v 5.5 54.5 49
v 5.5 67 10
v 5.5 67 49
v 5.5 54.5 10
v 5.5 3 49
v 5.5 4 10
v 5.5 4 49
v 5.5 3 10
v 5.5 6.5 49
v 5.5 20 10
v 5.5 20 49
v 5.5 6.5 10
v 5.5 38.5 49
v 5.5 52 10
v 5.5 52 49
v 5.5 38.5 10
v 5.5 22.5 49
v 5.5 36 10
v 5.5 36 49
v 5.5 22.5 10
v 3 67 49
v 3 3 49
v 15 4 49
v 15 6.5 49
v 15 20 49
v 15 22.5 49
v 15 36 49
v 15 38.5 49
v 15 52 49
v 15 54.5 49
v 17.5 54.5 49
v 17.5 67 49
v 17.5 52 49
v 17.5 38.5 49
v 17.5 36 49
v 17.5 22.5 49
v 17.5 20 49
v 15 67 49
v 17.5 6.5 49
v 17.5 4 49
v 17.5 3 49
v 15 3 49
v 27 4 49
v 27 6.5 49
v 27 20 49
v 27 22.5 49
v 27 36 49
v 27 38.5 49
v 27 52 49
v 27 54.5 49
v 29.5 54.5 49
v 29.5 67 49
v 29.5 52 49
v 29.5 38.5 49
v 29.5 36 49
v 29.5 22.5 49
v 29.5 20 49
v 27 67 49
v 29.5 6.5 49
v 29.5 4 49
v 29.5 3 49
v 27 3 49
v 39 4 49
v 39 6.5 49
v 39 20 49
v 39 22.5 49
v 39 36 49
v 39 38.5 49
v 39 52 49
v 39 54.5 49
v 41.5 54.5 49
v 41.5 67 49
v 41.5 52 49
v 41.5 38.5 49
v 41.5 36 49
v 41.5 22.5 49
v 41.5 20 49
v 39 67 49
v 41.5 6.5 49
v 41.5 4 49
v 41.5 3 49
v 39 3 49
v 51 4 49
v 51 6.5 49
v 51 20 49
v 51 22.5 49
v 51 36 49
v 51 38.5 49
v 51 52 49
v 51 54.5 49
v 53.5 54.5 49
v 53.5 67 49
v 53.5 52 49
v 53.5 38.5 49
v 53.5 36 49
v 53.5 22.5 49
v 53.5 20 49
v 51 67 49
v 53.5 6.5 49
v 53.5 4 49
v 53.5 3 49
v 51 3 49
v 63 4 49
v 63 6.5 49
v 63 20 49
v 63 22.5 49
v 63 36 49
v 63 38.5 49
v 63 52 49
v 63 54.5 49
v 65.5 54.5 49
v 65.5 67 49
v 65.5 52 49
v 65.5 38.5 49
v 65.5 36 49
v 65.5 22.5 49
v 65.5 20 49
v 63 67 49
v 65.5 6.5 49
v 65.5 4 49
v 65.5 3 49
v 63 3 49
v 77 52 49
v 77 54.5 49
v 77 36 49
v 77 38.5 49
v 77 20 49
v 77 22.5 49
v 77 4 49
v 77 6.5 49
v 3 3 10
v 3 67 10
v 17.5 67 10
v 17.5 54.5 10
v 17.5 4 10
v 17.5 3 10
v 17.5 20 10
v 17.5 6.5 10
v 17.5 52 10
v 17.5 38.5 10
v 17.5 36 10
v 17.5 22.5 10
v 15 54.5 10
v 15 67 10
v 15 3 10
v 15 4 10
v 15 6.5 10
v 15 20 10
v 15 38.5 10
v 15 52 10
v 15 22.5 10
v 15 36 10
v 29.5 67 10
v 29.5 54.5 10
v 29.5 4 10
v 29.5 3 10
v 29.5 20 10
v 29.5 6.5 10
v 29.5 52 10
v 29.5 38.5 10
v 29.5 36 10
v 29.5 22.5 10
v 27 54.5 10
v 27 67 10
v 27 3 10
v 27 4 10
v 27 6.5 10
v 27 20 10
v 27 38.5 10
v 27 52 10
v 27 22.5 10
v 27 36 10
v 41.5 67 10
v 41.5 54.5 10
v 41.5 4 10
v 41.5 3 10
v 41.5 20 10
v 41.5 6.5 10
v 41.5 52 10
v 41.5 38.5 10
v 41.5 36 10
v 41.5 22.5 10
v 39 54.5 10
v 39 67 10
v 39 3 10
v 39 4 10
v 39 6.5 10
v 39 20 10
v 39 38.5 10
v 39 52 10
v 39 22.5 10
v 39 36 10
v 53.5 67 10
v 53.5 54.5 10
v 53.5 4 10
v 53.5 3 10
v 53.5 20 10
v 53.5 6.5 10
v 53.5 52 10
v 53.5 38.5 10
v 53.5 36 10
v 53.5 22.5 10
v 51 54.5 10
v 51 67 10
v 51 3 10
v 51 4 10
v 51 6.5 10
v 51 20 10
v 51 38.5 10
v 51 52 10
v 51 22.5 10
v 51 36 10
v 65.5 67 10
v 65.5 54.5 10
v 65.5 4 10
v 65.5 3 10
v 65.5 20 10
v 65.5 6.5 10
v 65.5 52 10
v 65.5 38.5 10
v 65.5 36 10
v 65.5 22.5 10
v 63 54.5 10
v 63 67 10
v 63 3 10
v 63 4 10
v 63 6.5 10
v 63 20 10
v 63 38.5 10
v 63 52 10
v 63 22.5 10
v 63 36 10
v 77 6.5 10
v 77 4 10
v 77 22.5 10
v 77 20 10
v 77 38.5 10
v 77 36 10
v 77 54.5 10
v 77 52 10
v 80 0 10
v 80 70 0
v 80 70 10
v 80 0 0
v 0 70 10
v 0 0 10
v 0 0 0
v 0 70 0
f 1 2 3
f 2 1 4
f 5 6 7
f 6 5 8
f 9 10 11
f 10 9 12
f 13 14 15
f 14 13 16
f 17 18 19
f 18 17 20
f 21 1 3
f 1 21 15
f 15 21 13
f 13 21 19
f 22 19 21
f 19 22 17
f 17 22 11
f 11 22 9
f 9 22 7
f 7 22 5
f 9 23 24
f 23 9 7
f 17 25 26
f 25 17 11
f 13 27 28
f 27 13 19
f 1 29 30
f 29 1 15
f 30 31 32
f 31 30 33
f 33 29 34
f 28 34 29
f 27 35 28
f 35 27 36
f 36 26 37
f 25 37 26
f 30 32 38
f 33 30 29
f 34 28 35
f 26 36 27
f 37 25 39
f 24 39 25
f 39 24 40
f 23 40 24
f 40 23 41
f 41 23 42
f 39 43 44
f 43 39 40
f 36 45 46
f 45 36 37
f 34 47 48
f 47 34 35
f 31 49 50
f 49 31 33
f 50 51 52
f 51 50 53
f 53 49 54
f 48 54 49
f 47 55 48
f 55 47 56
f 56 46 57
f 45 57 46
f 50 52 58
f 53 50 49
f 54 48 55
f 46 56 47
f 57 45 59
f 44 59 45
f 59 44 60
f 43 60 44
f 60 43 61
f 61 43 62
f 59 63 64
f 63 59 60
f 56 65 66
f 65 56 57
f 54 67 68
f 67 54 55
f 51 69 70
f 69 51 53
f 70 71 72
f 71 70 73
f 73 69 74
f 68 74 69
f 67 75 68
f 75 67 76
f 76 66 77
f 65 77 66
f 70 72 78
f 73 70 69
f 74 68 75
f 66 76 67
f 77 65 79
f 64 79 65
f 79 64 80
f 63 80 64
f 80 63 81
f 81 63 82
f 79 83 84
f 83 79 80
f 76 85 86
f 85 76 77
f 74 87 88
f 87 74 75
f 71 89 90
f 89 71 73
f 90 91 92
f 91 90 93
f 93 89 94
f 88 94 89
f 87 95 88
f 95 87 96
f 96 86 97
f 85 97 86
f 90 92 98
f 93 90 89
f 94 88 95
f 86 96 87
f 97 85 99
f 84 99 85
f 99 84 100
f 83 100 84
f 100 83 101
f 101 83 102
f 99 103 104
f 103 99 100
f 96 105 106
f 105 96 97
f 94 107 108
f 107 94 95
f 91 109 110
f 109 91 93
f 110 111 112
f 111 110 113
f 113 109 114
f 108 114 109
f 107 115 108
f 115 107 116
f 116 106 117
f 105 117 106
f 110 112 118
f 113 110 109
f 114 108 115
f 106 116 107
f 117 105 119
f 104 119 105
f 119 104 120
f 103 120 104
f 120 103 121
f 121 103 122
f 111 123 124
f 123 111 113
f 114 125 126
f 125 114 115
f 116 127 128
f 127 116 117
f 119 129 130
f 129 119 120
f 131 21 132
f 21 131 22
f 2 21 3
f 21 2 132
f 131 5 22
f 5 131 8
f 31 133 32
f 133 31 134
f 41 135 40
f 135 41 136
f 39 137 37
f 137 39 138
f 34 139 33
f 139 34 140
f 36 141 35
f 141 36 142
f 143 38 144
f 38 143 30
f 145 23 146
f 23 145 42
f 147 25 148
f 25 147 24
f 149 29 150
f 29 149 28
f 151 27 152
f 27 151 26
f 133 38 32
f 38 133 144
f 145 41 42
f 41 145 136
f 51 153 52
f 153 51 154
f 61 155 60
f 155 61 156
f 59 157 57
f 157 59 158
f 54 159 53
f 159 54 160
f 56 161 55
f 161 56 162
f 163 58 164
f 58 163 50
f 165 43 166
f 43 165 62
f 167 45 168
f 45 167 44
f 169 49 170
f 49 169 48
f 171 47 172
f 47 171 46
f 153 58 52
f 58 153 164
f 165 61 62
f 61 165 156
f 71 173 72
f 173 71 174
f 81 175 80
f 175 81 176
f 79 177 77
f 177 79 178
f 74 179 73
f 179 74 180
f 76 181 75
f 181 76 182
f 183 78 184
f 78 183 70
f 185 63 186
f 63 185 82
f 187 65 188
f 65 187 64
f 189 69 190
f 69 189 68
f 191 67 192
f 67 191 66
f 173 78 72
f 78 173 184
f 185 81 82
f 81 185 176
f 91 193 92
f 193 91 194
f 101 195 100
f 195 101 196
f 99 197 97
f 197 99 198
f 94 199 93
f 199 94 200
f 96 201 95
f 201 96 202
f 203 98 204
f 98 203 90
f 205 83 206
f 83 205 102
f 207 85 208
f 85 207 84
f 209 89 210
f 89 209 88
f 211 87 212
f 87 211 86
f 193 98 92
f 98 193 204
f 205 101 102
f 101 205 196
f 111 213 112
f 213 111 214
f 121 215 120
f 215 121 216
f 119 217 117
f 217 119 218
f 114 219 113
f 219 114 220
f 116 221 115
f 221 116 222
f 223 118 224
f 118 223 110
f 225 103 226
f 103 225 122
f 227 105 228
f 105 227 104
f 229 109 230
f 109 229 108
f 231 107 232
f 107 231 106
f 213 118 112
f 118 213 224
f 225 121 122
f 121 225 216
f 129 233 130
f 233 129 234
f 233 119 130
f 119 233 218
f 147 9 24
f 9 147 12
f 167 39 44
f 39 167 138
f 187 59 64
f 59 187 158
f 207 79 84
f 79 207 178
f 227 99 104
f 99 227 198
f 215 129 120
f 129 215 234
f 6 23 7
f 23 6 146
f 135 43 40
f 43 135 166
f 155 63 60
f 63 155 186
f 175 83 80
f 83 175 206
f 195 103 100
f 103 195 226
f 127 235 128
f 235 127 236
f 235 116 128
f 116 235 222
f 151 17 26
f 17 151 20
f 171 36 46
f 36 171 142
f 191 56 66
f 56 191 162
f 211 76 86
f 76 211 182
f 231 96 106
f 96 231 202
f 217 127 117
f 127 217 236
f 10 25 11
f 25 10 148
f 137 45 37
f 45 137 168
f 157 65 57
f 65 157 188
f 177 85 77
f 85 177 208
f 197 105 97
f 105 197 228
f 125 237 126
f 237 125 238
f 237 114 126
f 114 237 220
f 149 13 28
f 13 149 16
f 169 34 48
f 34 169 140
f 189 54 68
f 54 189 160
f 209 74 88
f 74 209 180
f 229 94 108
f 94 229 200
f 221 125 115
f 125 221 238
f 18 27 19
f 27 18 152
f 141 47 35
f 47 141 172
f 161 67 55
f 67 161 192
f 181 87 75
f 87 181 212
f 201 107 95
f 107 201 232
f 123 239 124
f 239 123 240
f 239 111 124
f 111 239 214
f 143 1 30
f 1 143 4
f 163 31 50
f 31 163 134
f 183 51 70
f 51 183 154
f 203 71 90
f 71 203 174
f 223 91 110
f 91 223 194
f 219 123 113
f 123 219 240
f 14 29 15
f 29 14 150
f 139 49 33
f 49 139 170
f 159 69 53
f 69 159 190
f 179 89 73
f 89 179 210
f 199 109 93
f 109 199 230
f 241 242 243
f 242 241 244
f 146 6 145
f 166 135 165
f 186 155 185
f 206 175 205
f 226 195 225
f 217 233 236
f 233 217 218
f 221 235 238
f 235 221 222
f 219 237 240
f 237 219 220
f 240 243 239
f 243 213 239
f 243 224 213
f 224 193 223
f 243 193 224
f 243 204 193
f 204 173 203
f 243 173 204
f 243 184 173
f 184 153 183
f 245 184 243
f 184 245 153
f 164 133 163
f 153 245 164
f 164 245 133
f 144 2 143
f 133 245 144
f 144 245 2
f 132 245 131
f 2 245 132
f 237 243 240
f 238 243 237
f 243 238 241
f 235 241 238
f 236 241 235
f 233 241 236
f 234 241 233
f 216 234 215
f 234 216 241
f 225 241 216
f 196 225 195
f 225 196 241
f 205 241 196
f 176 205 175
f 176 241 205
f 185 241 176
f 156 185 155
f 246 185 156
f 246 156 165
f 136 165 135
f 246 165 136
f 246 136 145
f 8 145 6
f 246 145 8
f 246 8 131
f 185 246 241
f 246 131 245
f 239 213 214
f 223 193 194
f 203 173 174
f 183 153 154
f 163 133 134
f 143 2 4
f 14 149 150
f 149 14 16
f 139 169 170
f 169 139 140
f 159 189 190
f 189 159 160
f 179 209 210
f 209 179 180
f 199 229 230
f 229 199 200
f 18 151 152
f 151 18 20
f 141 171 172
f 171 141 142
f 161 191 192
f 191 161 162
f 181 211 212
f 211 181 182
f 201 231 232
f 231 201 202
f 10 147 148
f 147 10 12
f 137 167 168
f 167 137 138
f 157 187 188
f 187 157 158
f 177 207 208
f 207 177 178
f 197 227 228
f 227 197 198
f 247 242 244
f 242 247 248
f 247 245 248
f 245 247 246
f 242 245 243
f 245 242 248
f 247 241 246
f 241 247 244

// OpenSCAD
$fn = 32;

// ----------------------------------------------------------------------
// Heatsink: cross fin block
// ----------------------------------------------------------------------

// --- parameters (mm) ---
base_l = 80;              // base length, X
base_w = 70;              // base width, Y
base_t = 10;              // base plate thickness
fin_h = 40;               // fin height above the base
fin_t = 2.5;              // fin thickness
edge = 3;                 // margin from the base ends
pitch = 12;               // fin pitch
rib_pitch = 16;           // cross rib pitch
fit_tol = 0.05;           // tolerance for press fits, mm
free_tol = 0.3;           // tolerance for clearance fits, mm

n_fins = floor((base_l - 2 * edge - fin_t) / pitch) + 1;  // fin count
total_h = base_t + fin_h - 1;  // overall height
n_ribs = floor((base_w - 2 * edge) / rib_pitch);  // rib count

union() {
  cube([base_l, base_w, base_t]);
  for (i = [0 : n_fins - 1])
    translate([edge + i * pitch, edge, base_t - 1])
      cube([fin_t, base_w - 2 * edge, fin_h]);
  for (i = [0 : n_ribs - 1])
    translate([edge, edge + 1 + i * rib_pitch, base_t - 1])
      cube([base_l - 2 * edge, fin_t, fin_h]);
}
